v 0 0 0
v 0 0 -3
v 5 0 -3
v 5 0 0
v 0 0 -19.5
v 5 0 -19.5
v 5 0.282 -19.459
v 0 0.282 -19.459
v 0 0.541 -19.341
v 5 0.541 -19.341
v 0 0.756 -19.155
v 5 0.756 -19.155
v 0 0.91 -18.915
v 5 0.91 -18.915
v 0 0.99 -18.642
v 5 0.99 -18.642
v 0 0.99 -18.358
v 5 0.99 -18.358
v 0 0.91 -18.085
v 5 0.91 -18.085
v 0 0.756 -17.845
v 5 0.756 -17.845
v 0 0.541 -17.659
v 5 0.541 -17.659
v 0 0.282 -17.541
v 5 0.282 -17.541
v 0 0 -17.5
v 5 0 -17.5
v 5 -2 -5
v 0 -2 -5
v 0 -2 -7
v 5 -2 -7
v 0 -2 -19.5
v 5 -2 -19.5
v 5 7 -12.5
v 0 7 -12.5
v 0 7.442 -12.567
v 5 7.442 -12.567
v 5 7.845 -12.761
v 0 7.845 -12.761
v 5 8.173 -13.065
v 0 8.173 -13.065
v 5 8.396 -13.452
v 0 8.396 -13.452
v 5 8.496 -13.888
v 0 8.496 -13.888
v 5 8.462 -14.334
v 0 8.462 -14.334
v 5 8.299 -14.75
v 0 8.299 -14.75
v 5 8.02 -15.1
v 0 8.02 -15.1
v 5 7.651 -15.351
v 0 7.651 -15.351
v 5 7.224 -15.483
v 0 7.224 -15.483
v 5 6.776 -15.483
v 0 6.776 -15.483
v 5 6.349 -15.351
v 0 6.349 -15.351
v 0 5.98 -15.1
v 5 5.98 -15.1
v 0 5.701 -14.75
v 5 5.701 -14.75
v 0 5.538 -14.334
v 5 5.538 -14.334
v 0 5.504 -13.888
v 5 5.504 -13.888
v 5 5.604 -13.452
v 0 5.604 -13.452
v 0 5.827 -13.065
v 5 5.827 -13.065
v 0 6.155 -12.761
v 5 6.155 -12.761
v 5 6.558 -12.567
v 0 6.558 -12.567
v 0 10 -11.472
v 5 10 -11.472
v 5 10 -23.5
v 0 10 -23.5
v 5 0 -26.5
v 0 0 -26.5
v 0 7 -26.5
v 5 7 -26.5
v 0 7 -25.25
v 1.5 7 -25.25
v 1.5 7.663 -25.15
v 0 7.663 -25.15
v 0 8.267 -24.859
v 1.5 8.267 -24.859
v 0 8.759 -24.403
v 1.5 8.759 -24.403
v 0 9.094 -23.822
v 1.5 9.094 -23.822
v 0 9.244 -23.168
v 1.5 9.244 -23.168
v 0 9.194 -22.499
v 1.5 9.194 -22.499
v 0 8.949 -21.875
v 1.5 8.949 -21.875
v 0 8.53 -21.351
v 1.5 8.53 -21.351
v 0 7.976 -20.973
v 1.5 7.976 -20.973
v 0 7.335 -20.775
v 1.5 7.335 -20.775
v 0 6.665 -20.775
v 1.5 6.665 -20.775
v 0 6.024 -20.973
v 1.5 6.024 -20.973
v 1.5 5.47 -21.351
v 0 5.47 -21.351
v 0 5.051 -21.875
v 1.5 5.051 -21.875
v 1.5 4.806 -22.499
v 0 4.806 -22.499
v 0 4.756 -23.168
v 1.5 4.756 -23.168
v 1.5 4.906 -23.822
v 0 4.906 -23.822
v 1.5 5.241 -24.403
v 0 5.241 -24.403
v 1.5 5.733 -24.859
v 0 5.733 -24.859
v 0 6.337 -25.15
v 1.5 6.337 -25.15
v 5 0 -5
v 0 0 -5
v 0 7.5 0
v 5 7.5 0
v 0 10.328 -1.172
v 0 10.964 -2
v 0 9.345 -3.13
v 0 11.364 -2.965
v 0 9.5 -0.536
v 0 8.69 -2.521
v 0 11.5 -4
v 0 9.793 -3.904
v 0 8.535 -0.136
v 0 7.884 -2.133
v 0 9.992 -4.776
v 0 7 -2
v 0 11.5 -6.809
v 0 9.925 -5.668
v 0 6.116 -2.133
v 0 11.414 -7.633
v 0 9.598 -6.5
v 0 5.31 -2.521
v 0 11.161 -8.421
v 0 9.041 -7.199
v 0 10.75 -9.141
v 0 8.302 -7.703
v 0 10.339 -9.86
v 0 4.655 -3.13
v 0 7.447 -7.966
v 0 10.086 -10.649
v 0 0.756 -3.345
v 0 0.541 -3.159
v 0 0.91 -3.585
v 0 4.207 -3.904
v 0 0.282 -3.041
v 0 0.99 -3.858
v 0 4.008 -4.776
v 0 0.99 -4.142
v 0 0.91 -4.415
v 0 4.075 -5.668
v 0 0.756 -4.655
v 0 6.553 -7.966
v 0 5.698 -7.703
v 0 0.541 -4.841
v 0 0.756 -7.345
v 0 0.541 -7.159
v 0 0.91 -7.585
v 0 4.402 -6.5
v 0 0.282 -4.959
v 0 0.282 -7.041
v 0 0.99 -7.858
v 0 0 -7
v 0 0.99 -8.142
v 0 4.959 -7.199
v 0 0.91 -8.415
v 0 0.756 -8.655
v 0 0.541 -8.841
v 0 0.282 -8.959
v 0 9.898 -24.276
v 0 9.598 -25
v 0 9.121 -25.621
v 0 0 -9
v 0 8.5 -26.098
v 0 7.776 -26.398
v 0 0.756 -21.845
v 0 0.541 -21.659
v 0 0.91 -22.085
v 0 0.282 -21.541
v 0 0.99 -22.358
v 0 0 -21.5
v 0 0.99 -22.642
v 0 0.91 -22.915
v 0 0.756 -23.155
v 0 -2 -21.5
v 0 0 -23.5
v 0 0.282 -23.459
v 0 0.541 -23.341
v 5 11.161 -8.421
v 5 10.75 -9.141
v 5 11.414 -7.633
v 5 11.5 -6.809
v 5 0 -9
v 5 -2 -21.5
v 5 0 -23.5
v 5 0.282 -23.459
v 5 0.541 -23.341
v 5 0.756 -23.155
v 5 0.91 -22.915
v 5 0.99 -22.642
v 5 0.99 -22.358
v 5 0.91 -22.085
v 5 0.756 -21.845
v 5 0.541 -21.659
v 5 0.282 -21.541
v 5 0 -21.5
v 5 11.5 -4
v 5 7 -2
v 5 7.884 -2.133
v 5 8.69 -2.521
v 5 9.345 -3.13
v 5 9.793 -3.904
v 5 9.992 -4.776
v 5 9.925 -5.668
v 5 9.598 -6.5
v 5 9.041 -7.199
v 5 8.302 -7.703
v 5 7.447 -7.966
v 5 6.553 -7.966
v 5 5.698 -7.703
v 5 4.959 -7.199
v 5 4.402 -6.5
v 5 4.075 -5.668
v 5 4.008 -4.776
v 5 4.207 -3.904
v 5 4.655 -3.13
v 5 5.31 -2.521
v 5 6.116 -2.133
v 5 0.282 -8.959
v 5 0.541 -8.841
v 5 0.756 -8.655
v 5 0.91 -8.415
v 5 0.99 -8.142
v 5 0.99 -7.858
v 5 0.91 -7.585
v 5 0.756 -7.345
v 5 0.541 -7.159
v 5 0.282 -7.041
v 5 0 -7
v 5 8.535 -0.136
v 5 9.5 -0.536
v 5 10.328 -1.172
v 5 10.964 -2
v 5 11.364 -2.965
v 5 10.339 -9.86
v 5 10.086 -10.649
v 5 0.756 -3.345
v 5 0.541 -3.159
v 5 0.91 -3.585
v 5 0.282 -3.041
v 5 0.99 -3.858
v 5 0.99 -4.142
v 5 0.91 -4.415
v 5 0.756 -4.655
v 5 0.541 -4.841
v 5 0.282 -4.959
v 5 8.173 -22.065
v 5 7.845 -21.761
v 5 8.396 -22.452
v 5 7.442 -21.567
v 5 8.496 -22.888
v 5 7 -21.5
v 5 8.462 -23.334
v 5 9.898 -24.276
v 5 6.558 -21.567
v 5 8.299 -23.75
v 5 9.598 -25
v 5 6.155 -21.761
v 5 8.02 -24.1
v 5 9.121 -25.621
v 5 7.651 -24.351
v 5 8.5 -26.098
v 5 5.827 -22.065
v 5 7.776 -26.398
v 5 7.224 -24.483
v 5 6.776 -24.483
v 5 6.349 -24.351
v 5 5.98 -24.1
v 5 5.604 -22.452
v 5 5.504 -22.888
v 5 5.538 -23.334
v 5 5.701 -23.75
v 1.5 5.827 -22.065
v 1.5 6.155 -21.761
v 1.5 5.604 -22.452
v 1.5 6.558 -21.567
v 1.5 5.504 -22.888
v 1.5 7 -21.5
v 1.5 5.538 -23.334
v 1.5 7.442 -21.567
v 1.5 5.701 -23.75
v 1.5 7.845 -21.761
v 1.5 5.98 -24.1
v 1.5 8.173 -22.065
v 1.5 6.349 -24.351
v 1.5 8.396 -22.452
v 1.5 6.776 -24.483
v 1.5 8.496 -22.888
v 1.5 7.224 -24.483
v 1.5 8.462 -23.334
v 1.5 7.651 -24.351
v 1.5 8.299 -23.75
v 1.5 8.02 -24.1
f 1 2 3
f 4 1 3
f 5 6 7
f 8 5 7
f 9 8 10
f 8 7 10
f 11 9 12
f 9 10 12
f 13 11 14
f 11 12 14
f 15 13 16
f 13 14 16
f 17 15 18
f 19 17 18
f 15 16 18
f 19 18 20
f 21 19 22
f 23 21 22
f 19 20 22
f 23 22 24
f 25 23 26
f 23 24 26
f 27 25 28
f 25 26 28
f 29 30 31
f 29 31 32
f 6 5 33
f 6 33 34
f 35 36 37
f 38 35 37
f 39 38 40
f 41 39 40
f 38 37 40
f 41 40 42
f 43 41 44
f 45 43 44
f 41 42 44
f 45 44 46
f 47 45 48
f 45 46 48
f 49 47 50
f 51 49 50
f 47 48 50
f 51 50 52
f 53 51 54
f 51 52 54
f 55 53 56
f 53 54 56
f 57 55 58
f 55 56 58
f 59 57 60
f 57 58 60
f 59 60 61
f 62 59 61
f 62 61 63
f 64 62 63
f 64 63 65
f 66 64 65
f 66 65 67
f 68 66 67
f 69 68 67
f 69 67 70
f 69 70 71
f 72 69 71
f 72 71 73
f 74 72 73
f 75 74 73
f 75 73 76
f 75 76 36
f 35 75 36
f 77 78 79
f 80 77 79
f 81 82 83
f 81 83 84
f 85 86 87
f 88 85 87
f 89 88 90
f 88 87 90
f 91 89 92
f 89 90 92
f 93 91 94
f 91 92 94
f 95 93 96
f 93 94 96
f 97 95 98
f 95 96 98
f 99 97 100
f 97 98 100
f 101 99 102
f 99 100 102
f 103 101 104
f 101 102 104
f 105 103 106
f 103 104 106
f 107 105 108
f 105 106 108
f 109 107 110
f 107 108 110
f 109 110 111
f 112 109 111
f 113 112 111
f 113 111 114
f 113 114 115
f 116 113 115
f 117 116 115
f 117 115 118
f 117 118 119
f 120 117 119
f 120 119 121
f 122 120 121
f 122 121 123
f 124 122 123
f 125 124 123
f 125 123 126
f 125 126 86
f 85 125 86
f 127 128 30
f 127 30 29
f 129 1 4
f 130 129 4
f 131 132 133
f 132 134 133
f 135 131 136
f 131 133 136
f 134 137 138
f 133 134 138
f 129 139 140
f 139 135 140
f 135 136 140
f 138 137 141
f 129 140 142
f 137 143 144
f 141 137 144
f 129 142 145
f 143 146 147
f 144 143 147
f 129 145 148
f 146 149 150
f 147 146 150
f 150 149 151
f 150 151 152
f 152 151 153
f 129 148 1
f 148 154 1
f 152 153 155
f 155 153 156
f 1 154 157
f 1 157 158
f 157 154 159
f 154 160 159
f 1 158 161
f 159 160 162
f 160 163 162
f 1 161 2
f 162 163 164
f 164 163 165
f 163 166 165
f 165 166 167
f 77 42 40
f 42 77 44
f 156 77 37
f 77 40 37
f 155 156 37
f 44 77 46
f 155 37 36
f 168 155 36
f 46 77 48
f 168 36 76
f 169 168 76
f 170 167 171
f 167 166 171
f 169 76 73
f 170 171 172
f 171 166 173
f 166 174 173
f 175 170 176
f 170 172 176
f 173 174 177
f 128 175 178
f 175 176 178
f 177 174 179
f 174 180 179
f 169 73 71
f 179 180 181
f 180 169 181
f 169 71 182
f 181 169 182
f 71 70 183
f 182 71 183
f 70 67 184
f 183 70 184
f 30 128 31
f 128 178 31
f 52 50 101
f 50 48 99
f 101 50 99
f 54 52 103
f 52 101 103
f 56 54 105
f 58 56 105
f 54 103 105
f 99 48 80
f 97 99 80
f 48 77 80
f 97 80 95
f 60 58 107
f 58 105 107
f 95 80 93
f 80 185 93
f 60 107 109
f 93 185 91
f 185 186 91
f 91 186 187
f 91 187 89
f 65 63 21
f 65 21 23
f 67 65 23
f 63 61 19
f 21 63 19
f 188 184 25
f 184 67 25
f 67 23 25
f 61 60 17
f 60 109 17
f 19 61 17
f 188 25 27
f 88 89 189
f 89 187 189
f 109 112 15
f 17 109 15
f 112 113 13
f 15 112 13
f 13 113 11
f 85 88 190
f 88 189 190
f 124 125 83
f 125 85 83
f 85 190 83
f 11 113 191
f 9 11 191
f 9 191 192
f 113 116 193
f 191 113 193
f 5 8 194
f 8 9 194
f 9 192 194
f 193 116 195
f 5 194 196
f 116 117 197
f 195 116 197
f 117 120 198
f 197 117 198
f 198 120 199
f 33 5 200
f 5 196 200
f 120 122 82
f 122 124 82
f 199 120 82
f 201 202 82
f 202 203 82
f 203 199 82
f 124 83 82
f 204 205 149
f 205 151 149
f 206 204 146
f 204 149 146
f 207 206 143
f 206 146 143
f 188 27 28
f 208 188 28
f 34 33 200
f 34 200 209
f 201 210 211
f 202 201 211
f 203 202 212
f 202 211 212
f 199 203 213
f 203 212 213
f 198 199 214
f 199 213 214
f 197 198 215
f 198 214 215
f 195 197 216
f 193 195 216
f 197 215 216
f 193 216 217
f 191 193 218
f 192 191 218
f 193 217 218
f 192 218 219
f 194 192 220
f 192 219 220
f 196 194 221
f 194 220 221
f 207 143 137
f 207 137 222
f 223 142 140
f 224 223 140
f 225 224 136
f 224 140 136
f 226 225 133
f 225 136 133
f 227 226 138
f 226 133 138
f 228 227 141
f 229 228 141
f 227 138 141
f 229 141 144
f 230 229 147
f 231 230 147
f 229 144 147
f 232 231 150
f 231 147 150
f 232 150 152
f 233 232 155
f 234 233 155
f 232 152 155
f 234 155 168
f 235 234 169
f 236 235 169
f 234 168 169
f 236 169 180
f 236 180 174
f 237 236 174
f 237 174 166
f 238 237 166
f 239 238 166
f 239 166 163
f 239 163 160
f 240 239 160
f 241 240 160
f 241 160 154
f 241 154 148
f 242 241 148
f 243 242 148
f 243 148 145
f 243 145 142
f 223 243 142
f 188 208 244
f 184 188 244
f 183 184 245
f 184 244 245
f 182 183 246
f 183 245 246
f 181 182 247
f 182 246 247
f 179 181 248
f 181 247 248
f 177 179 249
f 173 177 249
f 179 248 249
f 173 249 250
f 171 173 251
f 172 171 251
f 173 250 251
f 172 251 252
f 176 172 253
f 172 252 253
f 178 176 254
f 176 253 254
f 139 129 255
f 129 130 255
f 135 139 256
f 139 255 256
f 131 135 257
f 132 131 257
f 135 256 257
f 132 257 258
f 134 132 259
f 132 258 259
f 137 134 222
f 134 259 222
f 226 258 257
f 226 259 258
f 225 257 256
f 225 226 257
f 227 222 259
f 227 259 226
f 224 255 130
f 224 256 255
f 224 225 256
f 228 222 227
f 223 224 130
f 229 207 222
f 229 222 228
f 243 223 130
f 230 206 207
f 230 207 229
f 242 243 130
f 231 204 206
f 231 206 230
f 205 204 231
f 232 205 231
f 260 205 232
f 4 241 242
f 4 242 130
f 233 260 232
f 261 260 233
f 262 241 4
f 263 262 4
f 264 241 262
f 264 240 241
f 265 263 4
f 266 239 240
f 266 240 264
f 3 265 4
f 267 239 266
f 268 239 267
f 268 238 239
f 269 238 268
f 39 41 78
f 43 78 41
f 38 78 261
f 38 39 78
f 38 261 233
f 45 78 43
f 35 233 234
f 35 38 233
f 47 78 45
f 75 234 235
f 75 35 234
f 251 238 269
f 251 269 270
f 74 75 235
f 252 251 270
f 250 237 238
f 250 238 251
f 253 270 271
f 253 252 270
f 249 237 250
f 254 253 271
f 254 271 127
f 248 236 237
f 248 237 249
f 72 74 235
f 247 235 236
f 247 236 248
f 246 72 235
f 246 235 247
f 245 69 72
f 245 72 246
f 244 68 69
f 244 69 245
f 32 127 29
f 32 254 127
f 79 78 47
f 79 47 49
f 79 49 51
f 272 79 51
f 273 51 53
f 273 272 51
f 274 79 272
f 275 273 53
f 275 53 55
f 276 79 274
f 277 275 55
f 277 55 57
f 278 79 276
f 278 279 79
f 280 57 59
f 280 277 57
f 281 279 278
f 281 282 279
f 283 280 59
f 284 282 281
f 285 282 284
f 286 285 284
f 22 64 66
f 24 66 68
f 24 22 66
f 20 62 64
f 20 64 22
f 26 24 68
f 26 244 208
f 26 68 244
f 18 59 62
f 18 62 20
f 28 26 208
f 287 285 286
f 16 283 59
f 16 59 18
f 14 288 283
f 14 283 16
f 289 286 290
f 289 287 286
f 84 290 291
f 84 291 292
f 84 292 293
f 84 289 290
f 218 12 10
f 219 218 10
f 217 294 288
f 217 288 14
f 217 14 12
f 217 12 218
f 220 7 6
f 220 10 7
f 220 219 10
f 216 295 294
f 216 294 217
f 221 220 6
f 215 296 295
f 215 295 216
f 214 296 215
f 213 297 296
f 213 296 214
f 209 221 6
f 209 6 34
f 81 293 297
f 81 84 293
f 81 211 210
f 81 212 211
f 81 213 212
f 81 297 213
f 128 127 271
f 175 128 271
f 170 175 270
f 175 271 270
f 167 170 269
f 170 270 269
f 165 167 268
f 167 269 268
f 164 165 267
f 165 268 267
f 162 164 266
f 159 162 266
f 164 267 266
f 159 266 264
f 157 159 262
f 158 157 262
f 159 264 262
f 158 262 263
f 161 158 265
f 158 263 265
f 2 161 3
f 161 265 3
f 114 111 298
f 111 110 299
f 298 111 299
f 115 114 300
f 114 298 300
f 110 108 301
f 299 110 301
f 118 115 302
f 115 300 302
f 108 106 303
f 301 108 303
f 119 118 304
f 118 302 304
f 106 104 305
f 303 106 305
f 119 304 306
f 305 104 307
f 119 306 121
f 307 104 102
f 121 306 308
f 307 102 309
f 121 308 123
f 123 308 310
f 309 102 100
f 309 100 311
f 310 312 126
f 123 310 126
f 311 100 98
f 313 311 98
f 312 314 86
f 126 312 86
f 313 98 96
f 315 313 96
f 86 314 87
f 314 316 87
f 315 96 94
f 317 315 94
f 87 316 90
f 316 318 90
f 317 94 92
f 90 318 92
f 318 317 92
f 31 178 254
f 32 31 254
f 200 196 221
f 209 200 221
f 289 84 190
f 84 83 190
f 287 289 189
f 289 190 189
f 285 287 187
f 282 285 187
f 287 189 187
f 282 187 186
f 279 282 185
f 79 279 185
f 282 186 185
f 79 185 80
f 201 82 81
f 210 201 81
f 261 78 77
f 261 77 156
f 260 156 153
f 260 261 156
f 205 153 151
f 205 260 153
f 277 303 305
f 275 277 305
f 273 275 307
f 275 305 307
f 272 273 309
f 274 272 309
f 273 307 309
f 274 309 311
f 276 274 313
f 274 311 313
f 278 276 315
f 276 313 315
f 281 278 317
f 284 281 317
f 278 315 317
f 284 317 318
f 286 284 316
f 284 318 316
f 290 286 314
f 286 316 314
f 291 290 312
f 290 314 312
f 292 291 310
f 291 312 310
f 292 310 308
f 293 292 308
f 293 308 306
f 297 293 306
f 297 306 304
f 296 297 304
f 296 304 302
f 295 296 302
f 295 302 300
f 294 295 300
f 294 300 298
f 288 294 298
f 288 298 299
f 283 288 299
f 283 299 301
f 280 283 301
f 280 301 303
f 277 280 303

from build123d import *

# Parameters (mm, degrees)
BASE_W                    = 5
BASE_H                    = 26.5
BODY_DEPTH                = 11.5
F_6_0MM_MOTOR_D           = 6
F_3_0MM_BEARINGS_D        = 3
WEIGHT_SAVER_REACH        = 31.317
SKETCH9_W                 = 18.15
SKETCH9_H                 = 1.5
FILLET2_R                 = 3
FILLET1_R                 = 4
FILLET4_R                 = 4
FILLET5_R                 = 4
SKETCH10_W                = 5
SKETCH10_H                = 2
MOUNTING_DEPTH            = 2
MOUNTIN_UNDERCUT_REACH    = 31.317
F_4_0MM_DOWEL_HOLE2_D     = 4.5
F_4_0MM_DOWEL_HOLE2_DEPTH = 1.5


with BuildPart() as part:
    # base → body (new body)
    with BuildSketch(Plane(origin=(0, 0, 0), x_dir=(1, 0, 0), z_dir=(0, 1, 0))):
        with Locations((2.5, 13.25)):
            Rectangle(BASE_W, BASE_H)
    extrude(amount=BODY_DEPTH)

    # Ø6.0mm motor (through all)
    with Locations(Plane(origin=(5, 0, 0), x_dir=(0, 0, -1), z_dir=(1, 0, 0))):
        with Locations((5, 7)):
            Hole(F_6_0MM_MOTOR_D / 2)

    # Ø3.0mm bearings (through all)
    with Locations(Plane(origin=(5, 0, 0), x_dir=(0, 0, -1), z_dir=(1, 0, 0))):
        with Locations((14, 7), (23, 7)):
            Hole(F_3_0MM_BEARINGS_D / 2)

    # Sketch9 → weight_saver (cut, up to next)
    with BuildSketch(Plane(origin=(5, 0, 0), x_dir=(0, 0, -1), z_dir=(1, 0, 0)), mode=Mode.PRIVATE) as weight_saver_sk1:
        with Locations((17.425, 10.75)):
            Rectangle(SKETCH9_W, SKETCH9_H)
    weight_saver_tool1 = extrude(weight_saver_sk1.sketch, amount=-WEIGHT_SAVER_REACH, mode=Mode.PRIVATE) & part.part
    add(weight_saver_tool1.solids().sort_by_distance((5, 10.75, -17.425))[0], mode=Mode.SUBTRACT)

    # Fillet2
    fillet2_edges = [part.edges().sort_by_distance(p)[0] for p in [
        (2.5, 10, -26.5),
    ]]
    fillet(fillet2_edges, radius=FILLET2_R)

    # Fillet1
    fillet1_edges = [part.edges().sort_by_distance(p)[0] for p in [
        (2.5, 11.5, 0),
    ]]
    fillet(fillet1_edges, radius=FILLET1_R)

    # Fillet4
    # the kernel refuses this fillet: 4 mm, written as the material it adds along each edge
    with BuildSketch(Plane(origin=(5, 10, -8.35), x_dir=(0, 1, 0), z_dir=(-1, 0, 0))) as fillet4_piece_1:
        with BuildLine():
            CenterArc((4, 3.122498999), FILLET4_R, 180, 51.317812547)
            Line((0, 3.122498999), (-0.08, 3.122498999))
            Line((-0.08, 3.122498999), (-0.08, 0))
            Line((-0.08, 0), (0, -0.08))
            ThreePointArc((0, -0.08), (0.75, -0.08), (1.45, -0.06244998))
            Line((1.45, -0.06244998), (1.5, 0))
        make_face()
    extrude(amount=5)

    # Fillet5
    fillet5_edges = [part.edges().sort_by_distance(p)[0] for p in [
        (2.5, 11.5, -8.35),
    ]]
    fillet(fillet5_edges, radius=FILLET5_R)

    # Sketch10 → mounting (add)
    with BuildSketch(Plane.XZ):
        with Locations((2.5, -6)):
            Rectangle(SKETCH10_W, SKETCH10_H)
        with Locations((2.5, -20.5)):
            Rectangle(SKETCH10_W, SKETCH10_H)
    extrude(amount=MOUNTING_DEPTH)

    # mounting_undercut → mountin_undercut (cut, up to next)
    with BuildSketch(Plane(origin=(5, 0, 0), x_dir=(0, 0, -1), z_dir=(1, 0, 0)), mode=Mode.PRIVATE) as mountin_undercut_sk1:
        with BuildLine():
            Line((3, 0), (5, 0))
            ThreePointArc((5, 0), (4, 1), (3, 0))
        make_face()
    mountin_undercut_tool1 = extrude(mountin_undercut_sk1.sketch, amount=-MOUNTIN_UNDERCUT_REACH, mode=Mode.PRIVATE) & part.part
    # mounting_undercut → mountin_undercut (cut, up to next)
    with BuildSketch(Plane(origin=(5, 0, 0), x_dir=(0, 0, -1), z_dir=(1, 0, 0)), mode=Mode.PRIVATE) as mountin_undercut_sk2:
        with BuildLine():
            Line((7, 0), (9, 0))
            ThreePointArc((9, 0), (8, 1), (7, 0))
        make_face()
    mountin_undercut_tool2 = extrude(mountin_undercut_sk2.sketch, amount=-MOUNTIN_UNDERCUT_REACH, mode=Mode.PRIVATE) & part.part
    # mounting_undercut → mountin_undercut (cut, up to next)
    with BuildSketch(Plane(origin=(5, 0, 0), x_dir=(0, 0, -1), z_dir=(1, 0, 0)), mode=Mode.PRIVATE) as mountin_undercut_sk3:
        with BuildLine():
            Line((17.5, 0), (19.5, 0))
            ThreePointArc((19.5, 0), (18.5, 1), (17.5, 0))
        make_face()
    mountin_undercut_tool3 = extrude(mountin_undercut_sk3.sketch, amount=-MOUNTIN_UNDERCUT_REACH, mode=Mode.PRIVATE) & part.part
    # mounting_undercut → mountin_undercut (cut, up to next)
    with BuildSketch(Plane(origin=(5, 0, 0), x_dir=(0, 0, -1), z_dir=(1, 0, 0)), mode=Mode.PRIVATE) as mountin_undercut_sk4:
        with BuildLine():
            Line((21.5, 0), (23.5, 0))
            ThreePointArc((23.5, 0), (22.5, 1), (21.5, 0))
        make_face()
    mountin_undercut_tool4 = extrude(mountin_undercut_sk4.sketch, amount=-MOUNTIN_UNDERCUT_REACH, mode=Mode.PRIVATE) & part.part
    add(mountin_undercut_tool1.solids().sort_by_distance((5, 0.424413, -4))[0], mode=Mode.SUBTRACT)
    add(mountin_undercut_tool2.solids().sort_by_distance((5, 0.424413, -8))[0], mode=Mode.SUBTRACT)
    add(mountin_undercut_tool3.solids().sort_by_distance((5, 0.424413, -18.5))[0], mode=Mode.SUBTRACT)
    add(mountin_undercut_tool4.solids().sort_by_distance((5, 0.424413, -22.5))[0], mode=Mode.SUBTRACT)

    # Ø4.0mm Dowel Hole2
    with Locations(Plane.ZY):
        with Locations((-23, 7)):
            Hole(F_4_0MM_DOWEL_HOLE2_D / 2, depth=F_4_0MM_DOWEL_HOLE2_DEPTH)


solid = part.part
